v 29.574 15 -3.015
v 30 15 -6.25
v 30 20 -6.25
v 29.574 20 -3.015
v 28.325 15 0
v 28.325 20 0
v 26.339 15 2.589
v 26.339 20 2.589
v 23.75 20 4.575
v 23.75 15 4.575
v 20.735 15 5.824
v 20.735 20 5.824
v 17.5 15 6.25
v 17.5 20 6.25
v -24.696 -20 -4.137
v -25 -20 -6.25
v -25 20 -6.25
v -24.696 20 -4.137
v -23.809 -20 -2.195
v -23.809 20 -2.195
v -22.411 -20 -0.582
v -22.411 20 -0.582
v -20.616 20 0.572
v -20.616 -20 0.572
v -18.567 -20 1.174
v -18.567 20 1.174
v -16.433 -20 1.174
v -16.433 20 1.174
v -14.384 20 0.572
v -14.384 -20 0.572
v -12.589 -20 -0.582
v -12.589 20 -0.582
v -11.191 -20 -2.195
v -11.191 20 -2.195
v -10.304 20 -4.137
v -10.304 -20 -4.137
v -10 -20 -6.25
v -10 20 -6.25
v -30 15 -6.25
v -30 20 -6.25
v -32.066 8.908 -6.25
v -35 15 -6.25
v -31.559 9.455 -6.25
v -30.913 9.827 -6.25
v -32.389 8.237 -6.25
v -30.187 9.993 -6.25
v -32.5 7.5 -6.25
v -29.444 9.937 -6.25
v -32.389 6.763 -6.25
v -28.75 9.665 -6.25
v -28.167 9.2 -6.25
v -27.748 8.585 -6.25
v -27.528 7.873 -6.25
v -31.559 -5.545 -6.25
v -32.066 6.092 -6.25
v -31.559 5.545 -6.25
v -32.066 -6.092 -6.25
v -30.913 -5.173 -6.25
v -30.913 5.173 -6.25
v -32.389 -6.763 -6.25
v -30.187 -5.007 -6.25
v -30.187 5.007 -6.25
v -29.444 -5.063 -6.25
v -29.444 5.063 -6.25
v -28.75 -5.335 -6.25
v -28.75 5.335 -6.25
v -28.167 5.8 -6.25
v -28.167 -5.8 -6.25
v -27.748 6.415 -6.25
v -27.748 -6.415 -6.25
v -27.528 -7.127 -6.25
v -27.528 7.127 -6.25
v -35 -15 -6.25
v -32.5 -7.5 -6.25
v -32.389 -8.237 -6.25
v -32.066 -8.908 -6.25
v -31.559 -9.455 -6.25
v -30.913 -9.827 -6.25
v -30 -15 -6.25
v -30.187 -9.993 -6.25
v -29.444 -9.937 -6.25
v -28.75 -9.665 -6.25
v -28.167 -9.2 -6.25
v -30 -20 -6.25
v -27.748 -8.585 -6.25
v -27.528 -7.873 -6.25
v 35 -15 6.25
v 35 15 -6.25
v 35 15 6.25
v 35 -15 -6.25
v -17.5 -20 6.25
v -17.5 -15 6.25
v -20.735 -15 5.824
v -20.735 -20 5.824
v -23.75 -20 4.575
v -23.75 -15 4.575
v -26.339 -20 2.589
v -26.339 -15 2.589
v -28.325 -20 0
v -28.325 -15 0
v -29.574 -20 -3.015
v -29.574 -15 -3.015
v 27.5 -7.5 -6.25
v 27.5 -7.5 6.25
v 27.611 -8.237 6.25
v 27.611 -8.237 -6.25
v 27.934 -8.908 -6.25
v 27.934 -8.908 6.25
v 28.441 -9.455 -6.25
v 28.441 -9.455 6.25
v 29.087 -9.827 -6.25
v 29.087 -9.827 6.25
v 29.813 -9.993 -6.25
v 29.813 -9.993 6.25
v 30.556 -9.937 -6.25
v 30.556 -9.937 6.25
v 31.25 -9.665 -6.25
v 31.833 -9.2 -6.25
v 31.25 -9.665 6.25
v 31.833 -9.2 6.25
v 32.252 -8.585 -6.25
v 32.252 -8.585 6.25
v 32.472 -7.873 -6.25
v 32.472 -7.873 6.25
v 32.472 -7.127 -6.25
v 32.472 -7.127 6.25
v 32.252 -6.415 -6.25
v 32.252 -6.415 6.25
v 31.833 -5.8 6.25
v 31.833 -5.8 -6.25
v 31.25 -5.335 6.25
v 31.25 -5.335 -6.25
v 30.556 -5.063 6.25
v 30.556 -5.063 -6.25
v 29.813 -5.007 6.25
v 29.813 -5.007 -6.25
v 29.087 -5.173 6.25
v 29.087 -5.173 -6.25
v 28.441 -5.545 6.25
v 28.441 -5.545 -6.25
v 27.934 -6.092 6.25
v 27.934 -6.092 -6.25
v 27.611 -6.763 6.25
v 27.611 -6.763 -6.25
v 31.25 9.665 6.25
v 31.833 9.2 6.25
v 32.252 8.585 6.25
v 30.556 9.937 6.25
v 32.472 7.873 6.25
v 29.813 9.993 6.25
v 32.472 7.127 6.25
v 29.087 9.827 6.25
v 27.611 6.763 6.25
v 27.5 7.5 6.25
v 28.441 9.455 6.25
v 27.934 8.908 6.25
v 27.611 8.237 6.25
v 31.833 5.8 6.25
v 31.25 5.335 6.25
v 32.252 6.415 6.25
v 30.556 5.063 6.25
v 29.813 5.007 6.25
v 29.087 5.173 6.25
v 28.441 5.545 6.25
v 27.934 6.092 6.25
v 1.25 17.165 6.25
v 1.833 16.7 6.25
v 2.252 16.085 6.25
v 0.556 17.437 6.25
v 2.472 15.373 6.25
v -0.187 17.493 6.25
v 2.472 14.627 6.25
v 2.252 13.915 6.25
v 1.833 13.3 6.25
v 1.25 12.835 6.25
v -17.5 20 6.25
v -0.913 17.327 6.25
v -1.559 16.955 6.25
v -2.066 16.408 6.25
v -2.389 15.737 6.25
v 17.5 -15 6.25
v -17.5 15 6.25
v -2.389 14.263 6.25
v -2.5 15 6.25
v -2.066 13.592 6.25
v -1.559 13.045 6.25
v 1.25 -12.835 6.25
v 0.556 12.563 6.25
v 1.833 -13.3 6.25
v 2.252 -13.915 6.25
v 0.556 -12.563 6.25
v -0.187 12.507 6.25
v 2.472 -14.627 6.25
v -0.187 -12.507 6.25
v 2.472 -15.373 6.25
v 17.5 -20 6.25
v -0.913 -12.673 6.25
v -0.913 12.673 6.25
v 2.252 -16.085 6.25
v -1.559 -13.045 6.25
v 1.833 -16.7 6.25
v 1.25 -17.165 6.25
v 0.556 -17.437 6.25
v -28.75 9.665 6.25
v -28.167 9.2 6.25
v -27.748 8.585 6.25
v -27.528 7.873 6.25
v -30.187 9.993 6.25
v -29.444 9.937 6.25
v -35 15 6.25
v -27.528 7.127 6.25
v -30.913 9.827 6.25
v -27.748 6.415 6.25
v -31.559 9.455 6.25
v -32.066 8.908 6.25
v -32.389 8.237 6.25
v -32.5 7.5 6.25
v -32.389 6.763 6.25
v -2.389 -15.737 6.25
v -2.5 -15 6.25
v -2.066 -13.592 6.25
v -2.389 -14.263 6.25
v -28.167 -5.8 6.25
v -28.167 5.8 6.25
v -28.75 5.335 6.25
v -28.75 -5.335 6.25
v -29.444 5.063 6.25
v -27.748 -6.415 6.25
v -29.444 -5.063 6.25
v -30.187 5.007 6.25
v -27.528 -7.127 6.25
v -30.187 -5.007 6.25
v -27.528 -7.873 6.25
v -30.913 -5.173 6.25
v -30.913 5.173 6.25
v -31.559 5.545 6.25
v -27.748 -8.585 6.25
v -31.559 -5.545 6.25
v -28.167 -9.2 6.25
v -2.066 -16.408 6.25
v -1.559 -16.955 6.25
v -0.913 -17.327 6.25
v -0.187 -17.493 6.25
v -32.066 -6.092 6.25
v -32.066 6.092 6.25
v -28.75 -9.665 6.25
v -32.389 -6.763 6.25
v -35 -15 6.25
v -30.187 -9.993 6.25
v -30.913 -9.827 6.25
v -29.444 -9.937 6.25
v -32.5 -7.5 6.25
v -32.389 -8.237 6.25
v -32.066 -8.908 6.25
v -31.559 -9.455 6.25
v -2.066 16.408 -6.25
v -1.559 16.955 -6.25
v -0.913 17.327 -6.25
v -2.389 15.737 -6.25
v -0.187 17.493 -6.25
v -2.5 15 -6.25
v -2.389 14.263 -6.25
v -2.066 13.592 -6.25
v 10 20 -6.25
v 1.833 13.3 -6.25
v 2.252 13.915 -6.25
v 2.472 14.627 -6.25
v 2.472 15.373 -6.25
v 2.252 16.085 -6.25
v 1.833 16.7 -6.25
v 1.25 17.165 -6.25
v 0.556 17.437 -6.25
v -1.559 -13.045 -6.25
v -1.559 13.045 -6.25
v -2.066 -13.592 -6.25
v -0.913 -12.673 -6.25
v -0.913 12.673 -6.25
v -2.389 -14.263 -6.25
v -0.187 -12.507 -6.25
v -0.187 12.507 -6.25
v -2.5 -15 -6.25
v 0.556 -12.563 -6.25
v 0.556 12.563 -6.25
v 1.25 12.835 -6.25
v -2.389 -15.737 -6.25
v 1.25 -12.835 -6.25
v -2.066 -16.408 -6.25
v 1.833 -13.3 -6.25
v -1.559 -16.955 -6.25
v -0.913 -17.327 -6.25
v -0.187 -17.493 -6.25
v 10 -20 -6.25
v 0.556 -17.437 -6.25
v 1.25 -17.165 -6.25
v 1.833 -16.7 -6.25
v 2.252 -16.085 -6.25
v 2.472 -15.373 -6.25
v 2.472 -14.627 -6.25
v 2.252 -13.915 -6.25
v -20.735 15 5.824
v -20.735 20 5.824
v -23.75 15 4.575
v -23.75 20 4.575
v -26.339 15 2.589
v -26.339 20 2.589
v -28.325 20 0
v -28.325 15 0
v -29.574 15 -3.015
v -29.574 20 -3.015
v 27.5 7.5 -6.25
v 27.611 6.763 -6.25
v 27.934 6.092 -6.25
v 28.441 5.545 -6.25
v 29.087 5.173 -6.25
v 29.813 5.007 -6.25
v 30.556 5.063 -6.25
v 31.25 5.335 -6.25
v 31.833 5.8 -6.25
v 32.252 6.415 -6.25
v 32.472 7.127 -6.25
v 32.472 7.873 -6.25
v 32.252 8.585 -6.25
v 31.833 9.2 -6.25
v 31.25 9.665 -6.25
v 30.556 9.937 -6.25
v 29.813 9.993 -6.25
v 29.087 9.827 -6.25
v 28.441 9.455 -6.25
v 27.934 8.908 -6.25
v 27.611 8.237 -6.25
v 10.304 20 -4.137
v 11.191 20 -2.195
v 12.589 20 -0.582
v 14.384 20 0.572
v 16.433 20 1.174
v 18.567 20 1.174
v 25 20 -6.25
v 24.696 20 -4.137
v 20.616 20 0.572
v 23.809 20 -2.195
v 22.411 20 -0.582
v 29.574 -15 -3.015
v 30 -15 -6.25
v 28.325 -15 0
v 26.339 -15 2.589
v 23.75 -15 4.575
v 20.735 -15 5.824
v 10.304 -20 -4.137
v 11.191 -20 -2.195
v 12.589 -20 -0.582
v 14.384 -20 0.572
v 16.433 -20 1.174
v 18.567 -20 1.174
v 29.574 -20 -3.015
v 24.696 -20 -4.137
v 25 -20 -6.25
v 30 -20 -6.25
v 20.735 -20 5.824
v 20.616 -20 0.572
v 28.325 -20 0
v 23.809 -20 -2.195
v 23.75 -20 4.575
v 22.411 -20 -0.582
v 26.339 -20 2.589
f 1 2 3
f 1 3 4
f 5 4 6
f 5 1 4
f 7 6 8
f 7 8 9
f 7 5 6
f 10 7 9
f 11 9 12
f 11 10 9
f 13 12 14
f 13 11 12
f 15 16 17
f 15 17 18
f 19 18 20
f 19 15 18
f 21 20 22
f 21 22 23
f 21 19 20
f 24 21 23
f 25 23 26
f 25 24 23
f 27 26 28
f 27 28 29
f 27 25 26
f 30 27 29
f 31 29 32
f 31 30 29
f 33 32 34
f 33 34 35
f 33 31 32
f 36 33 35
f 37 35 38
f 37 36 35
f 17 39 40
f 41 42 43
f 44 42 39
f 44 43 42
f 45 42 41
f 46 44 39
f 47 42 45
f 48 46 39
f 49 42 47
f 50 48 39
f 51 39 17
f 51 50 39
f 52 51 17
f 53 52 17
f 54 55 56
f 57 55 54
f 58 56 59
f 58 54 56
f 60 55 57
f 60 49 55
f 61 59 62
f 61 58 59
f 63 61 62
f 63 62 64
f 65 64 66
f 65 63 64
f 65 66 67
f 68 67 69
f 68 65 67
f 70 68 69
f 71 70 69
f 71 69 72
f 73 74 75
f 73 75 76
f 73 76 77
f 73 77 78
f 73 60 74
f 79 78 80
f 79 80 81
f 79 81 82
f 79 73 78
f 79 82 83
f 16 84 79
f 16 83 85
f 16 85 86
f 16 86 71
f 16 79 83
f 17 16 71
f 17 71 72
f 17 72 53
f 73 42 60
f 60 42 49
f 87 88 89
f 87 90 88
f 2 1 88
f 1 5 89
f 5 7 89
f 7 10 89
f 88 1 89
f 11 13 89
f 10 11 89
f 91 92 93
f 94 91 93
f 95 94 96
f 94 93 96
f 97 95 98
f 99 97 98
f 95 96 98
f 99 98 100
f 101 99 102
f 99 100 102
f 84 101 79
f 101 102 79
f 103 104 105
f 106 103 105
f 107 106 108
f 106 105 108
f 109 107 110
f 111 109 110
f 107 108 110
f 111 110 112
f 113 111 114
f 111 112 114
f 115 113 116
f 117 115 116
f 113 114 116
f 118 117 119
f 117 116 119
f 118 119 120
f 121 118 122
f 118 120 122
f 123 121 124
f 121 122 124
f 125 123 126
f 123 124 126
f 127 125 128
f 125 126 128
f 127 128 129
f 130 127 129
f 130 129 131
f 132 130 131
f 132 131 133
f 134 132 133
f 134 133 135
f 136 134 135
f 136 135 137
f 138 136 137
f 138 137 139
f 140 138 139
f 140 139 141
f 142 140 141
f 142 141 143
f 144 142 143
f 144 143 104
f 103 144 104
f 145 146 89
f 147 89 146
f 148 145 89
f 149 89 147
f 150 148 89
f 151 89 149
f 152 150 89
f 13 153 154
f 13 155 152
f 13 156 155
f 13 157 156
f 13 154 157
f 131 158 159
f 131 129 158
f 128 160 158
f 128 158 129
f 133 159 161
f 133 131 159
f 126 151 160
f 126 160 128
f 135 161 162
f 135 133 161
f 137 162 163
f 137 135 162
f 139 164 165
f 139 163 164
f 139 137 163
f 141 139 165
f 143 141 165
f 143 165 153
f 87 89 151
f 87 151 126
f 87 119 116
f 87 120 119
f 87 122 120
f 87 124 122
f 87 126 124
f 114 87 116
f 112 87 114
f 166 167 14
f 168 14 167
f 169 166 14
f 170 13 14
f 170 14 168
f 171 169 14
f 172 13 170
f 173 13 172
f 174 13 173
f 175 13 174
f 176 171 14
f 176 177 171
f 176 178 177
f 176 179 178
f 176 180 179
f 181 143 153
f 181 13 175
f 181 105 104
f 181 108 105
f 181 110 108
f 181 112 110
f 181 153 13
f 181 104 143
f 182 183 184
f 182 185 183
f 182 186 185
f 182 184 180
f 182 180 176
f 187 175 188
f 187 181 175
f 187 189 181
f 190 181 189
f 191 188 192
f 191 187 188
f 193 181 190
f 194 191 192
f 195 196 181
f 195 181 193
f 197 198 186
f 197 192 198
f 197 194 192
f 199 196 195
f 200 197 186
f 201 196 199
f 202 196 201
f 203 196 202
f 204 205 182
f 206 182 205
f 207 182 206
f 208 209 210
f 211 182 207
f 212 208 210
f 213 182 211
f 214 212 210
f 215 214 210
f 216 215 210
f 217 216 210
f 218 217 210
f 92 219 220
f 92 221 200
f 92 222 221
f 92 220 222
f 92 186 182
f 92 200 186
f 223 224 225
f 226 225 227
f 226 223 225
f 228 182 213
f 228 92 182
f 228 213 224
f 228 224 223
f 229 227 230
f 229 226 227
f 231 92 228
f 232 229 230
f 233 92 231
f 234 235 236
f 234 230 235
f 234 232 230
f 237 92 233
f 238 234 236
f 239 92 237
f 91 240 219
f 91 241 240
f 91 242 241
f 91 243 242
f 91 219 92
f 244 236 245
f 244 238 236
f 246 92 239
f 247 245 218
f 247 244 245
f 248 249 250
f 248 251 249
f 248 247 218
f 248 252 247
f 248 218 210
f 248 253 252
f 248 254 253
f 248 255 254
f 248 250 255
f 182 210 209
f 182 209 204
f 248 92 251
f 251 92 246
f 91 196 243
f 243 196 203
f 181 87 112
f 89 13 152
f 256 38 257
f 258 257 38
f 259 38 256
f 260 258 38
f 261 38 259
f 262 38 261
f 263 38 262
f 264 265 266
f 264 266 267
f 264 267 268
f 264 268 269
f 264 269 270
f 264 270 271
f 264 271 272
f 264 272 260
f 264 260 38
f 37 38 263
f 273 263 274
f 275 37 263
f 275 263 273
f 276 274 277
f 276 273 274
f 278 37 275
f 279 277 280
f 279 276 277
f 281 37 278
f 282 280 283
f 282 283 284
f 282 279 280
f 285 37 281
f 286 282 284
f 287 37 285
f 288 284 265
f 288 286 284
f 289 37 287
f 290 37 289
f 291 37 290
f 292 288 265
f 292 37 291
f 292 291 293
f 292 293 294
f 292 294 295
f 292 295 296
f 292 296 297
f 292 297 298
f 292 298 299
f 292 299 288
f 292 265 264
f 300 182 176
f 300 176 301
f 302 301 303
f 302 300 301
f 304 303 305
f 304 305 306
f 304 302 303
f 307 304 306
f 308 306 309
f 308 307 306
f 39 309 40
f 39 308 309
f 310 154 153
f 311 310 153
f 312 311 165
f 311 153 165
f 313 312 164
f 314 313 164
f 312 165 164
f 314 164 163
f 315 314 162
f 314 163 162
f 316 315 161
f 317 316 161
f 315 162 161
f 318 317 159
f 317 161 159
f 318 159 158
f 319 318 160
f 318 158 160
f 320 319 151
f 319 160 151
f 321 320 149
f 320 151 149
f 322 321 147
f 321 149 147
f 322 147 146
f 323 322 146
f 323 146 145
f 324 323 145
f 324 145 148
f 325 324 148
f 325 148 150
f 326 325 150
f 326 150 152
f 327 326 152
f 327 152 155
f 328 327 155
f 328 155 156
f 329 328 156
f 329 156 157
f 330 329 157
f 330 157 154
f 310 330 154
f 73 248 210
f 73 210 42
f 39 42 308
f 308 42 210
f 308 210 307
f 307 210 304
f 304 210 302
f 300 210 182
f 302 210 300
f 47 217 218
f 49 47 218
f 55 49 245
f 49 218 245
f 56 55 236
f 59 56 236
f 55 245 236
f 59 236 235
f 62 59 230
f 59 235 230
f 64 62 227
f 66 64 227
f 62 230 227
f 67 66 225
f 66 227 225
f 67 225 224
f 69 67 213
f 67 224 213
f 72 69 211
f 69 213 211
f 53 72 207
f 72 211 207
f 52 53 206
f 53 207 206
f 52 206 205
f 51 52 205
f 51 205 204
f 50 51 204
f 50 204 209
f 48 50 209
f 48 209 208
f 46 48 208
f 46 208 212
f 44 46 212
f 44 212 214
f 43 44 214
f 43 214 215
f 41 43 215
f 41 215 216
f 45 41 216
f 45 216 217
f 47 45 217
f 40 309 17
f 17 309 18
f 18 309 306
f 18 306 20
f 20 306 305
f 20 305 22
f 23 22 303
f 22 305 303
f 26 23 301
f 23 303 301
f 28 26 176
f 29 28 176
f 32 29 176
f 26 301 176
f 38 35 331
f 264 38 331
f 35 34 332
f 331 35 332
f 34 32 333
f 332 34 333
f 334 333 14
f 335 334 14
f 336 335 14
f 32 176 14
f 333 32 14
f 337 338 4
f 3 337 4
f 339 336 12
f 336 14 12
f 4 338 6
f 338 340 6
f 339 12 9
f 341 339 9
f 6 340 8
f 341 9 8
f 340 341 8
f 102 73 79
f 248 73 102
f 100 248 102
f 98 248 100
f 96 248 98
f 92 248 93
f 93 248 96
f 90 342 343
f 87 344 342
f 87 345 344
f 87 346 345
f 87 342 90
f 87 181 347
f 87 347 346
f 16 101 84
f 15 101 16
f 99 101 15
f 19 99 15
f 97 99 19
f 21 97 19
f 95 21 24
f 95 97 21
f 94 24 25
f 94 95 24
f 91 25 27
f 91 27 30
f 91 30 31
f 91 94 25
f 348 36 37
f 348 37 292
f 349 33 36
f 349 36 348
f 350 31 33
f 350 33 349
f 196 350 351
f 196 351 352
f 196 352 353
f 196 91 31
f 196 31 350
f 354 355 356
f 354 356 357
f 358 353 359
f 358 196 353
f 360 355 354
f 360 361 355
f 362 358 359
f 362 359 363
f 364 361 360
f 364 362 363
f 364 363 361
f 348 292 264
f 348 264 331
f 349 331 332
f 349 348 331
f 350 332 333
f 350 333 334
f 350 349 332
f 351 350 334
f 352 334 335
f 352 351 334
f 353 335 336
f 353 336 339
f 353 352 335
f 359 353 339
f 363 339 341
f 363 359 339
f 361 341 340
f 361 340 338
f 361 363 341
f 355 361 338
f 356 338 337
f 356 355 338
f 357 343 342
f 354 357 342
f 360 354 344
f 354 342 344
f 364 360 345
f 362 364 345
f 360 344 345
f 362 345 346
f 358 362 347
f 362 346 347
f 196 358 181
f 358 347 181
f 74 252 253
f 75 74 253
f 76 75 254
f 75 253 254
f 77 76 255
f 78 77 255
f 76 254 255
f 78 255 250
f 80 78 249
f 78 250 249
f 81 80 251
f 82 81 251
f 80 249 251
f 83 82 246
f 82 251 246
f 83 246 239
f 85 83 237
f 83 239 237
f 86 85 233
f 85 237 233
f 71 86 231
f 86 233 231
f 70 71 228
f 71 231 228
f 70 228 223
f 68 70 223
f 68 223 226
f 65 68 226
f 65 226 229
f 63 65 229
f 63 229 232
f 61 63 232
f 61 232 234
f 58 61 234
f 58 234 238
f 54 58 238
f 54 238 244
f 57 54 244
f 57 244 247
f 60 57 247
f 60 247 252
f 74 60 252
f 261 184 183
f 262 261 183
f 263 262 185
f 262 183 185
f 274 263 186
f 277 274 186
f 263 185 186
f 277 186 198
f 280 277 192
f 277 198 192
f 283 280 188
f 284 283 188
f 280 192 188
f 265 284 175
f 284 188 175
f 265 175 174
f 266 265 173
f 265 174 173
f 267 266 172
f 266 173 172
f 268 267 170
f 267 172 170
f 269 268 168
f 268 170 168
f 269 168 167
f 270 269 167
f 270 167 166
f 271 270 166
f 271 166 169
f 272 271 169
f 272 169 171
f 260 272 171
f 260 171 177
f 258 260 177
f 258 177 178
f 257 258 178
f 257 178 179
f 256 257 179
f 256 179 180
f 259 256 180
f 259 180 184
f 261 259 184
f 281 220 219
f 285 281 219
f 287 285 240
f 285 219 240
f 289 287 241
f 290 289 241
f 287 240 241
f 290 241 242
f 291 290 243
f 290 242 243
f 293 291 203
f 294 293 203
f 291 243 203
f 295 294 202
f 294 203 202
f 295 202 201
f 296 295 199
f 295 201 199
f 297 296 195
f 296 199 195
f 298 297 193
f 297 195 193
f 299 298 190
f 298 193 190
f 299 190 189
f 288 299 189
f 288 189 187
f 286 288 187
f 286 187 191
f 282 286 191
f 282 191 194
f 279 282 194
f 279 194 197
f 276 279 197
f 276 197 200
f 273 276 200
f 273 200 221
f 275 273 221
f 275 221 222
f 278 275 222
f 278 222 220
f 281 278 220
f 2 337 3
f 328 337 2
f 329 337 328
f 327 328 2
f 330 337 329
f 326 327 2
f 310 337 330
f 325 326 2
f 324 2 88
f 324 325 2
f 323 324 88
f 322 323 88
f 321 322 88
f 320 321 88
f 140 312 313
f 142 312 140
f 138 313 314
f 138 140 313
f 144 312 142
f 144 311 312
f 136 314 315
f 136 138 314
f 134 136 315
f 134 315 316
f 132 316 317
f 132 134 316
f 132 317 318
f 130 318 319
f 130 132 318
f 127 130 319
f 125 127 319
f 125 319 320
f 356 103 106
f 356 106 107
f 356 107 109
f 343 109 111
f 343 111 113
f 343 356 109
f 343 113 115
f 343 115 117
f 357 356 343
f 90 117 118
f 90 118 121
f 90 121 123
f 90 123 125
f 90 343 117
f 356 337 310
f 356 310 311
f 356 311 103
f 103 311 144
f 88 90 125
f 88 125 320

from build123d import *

# Parameters (mm, degrees)
F1_DEPTH = 15
F3_DEPTH = 5
F6_D     = 5


with BuildPart() as f1:
    # F0 (on Front) → F1 (new body, symmetric)
    with BuildSketch(Plane.XZ):
        with BuildLine():
            Line((35, 6.25), (-35, 6.25))
            Line((-35, 6.25), (-35, -6.25))
            Line((-35, -6.25), (-25, -6.25))
            ThreePointArc((-25, -6.25), (-17.5, 1.25), (-10, -6.25))
            Line((-10, -6.25), (10, -6.25))
            ThreePointArc((10, -6.25), (17.5, 1.25), (25, -6.25))
            Line((25, -6.25), (35, -6.25))
            Line((35, -6.25), (35, 6.25))
        make_face()
    extrude(amount=F1_DEPTH, both=True)

    # F2 (on face) → F3 (join)
    with BuildSketch(Plane.XZ.offset(15)):
        with BuildLine():
            ThreePointArc((-17.5, 6.25), (-26.338835, 2.588835), (-30, -6.25))
            Line((-30, -6.25), (-25, -6.25))
            ThreePointArc((-25, -6.25), (-17.5, 1.25), (-10, -6.25))
            Line((-10, -6.25), (10, -6.25))
            ThreePointArc((10, -6.25), (17.5, 1.25), (25, -6.25))
            Line((25, -6.25), (30, -6.25))
            ThreePointArc((30, -6.25), (26.338835, 2.588835), (17.5, 6.25))
            Line((17.5, 6.25), (-17.5, 6.25))
        make_face()
    extrude(amount=F3_DEPTH)

    # F4: F1 across plane


with BuildPart() as f1_1:
    add(f1.part)
    add(f1.part.mirror(Plane.XZ))

    # F6 (through all)
    with Locations(Plane(origin=(0, 0, -6.25), x_dir=(1, 0, 0), z_dir=(0, 0, -1))):
        with Locations((-30, 7.5), (-30, -7.5), (0, 15), (0, -15), (30, 7.5), (30, -7.5)):
            Hole(F6_D / 2)


solid = f1_1.part
